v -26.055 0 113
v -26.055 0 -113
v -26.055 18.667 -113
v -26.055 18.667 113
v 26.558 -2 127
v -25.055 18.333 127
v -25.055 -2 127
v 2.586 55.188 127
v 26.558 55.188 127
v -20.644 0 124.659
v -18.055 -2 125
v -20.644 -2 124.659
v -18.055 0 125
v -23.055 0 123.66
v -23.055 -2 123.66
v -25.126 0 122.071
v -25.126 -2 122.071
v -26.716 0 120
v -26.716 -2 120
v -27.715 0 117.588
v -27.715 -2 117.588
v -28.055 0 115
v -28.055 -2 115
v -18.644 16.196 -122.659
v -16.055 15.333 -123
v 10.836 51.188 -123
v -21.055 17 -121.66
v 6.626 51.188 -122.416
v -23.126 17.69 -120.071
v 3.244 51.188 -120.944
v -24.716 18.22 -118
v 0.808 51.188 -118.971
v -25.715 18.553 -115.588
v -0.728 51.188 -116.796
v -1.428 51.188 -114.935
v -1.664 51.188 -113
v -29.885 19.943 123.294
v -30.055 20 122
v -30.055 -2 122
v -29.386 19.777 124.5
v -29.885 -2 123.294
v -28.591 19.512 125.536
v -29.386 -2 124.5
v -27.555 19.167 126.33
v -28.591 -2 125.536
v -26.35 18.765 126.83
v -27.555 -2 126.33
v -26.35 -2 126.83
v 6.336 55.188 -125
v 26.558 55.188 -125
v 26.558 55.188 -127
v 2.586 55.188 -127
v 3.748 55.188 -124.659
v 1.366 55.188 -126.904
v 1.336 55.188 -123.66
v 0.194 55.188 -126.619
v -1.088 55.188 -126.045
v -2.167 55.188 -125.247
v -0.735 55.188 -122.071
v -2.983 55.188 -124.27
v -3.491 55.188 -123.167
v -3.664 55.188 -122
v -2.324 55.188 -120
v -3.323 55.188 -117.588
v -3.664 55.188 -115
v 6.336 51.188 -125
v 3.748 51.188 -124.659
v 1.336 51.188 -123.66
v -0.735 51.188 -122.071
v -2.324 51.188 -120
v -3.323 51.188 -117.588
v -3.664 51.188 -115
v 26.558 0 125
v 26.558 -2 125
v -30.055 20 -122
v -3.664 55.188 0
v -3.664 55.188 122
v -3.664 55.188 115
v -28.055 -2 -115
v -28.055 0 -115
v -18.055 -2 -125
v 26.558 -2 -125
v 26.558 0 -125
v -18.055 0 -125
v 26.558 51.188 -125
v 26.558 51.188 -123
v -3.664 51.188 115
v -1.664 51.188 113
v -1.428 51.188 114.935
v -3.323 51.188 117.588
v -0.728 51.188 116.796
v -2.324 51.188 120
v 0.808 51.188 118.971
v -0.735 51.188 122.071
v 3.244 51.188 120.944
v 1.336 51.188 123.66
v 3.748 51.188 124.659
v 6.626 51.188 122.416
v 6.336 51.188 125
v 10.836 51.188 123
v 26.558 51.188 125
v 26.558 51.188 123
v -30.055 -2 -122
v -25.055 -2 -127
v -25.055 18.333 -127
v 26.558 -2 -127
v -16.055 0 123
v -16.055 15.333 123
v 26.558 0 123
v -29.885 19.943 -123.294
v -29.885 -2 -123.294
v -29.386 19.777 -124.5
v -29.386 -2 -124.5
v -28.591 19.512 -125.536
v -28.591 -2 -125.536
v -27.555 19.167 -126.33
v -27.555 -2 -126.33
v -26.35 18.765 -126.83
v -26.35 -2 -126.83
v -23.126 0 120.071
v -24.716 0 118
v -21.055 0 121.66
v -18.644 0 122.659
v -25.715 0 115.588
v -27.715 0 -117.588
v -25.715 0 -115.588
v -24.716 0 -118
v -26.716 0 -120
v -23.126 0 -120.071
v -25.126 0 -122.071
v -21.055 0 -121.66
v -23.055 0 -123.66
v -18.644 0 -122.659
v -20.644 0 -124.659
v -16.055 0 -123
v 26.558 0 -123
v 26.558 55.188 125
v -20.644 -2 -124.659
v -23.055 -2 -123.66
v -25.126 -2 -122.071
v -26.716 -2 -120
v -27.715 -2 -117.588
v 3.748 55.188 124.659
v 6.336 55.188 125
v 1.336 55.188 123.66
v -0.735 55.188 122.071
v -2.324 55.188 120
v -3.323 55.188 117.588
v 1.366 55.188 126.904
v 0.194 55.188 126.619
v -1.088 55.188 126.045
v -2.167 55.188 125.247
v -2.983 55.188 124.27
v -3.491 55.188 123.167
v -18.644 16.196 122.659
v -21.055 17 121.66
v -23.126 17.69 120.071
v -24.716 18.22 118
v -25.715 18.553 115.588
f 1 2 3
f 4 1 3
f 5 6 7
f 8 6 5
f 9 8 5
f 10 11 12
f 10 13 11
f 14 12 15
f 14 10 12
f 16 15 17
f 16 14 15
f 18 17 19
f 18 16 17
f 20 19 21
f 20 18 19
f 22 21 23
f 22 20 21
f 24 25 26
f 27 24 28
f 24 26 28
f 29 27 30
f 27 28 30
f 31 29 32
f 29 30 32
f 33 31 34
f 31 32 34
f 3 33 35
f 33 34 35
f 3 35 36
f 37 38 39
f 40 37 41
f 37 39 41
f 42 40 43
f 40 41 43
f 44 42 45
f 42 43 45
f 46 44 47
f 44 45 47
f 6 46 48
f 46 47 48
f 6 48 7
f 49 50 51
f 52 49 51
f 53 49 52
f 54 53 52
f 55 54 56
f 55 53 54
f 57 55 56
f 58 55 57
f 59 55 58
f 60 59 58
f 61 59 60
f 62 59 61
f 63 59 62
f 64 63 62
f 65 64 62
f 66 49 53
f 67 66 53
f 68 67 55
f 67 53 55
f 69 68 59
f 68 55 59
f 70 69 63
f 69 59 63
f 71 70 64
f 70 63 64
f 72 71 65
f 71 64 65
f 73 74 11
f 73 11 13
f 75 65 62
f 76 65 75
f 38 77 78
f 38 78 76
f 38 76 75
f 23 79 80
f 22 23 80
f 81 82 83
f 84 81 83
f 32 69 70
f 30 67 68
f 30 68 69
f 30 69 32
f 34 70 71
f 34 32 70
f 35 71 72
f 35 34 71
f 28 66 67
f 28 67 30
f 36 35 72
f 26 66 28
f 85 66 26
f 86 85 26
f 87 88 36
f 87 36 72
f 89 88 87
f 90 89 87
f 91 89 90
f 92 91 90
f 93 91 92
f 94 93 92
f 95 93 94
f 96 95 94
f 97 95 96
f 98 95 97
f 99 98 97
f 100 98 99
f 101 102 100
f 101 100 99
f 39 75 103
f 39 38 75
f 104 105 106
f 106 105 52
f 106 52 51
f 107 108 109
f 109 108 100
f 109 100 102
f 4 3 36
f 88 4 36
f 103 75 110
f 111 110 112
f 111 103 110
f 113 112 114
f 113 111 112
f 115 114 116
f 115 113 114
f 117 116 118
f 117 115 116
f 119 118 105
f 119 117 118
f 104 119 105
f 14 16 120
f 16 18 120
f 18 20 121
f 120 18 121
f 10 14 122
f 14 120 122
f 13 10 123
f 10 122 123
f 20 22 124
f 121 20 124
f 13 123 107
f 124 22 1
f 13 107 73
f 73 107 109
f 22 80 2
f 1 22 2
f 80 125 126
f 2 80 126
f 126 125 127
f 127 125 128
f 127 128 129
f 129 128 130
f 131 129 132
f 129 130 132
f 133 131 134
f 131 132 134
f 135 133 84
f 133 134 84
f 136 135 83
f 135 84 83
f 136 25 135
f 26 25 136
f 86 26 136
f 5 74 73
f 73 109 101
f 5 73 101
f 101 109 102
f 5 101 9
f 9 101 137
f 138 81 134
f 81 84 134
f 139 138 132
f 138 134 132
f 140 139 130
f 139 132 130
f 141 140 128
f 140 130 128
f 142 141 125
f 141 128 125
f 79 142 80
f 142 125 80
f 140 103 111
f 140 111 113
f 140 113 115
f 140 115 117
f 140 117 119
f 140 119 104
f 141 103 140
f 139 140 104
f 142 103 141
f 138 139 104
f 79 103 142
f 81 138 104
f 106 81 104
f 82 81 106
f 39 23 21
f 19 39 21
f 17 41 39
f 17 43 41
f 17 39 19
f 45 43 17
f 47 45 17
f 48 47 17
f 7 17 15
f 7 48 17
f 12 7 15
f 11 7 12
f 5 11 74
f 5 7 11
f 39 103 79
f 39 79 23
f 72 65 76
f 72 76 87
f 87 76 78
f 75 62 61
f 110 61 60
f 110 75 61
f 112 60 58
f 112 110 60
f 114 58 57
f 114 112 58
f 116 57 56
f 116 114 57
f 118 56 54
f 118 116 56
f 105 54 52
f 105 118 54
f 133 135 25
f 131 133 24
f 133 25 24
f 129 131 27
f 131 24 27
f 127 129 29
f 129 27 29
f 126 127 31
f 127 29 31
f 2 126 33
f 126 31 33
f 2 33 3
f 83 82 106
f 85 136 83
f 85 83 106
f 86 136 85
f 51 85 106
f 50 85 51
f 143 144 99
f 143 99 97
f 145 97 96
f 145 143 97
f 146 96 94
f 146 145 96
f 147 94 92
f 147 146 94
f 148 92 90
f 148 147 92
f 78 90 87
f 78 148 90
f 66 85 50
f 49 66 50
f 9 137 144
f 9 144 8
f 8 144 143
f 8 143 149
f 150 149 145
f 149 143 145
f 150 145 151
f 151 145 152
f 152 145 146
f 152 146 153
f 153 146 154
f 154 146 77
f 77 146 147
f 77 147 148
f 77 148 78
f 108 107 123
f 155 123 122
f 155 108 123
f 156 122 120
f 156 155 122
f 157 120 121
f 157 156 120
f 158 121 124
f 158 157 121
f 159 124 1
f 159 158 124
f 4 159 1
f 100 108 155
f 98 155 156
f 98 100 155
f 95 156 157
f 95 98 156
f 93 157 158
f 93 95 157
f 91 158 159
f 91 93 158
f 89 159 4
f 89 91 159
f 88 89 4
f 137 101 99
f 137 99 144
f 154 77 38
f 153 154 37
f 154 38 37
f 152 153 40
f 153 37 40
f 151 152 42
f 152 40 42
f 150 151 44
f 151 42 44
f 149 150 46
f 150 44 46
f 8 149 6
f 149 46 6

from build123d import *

# Parameters (mm, degrees)
SALIENTE_EXTRUIR1_DEPTH = 123
SALIENTE_EXTRUIR2_DEPTH = 4
CROQUIS3_W              = 2
CROQUIS3_H              = 4
CORTAR_EXTRUIR1_DEPTH   = 30.221833509
CROQUIS3_3_W            = 2
CROQUIS3_3_H            = 2
CORTAR_EXTRUIR2_DEPTH   = 54.613071269
REDONDEO2_R             = 10
REDONDEO3_R             = 5


# Read off the part's stored shape, not the designer's step: Simetría1
with BuildPart() as part:
    # Croquis1 → Saliente-Extruir1 (new, symmetric)
    with BuildSketch(Plane.XY):
        Polygon((-30.055424469, 20), (-30.055424469, 0), (-30.055424469, -2), (-28.055424469, -2), (-28.055424469, 0), (-26.055424469, 0), (-26.055424469, 18.666666667), (-1.66418671, 51.188317013), (-3.66418671, 51.188317013), (-3.66418671, 55.188317013), align=None)
    extrude(amount=SALIENTE_EXTRUIR1_DEPTH, both=True)

    # Croquis2 → Saliente-Extruir2 (add)
    with BuildSketch(Plane.XY.offset(123)):
        Polygon((26.5576468, 13.444650029), (26.5576468, 18.666666667), (26.5576468, 55.188317013), (-3.66418671, 55.188317013), (-30.055424469, 20), (-30.055424469, 14.33808094), (-30.055424469, -2), (26.5576468, -2), align=None)
    extrude(amount=SALIENTE_EXTRUIR2_DEPTH)

    # Croquis3 → Cortar-Extruir1 (cut)
    with BuildSketch(Plane(origin=(26.5576468, 0, 0), x_dir=(0, 0, -1), z_dir=(1, 0, 0))):
        with Locations((-124, 53.188317013)):
            Rectangle(CROQUIS3_W, CROQUIS3_H)
    extrude(amount=-CORTAR_EXTRUIR1_DEPTH, mode=Mode.SUBTRACT)

    # Croquis3<3> → Cortar-Extruir2 (cut)
    with BuildSketch(Plane(origin=(26.5576468, 0, 0), x_dir=(0, 0, -1), z_dir=(1, 0, 0))):
        with Locations((-124, -1)):
            Rectangle(CROQUIS3_3_W, CROQUIS3_3_H)
    extrude(amount=-CORTAR_EXTRUIR2_DEPTH, mode=Mode.SUBTRACT)

    # Redondeo2
    redondeo2_edges = [part.edges().sort_by_distance(p)[0] for p in [
        (-26.055424469, 9.333333333, 123),
        (-3.664186709, 53.188317013, 125),
        (-28.055424469, -1, 125),
        (-13.85980559, 34.92749184, 123),
    ]]
    fillet(redondeo2_edges, radius=REDONDEO2_R)

    # Redondeo3
    redondeo3_edges = [part.edges().sort_by_distance(p)[0] for p in [
        (-16.85980559, 37.594158506, 127),
        (-30.055424469, 9, 127),
    ]]
    fillet(redondeo3_edges, radius=REDONDEO3_R)

    # Simetría1
    split(bisect_by=Plane(origin=(0, 0, 0), x_dir=(1, 0, 0), z_dir=(0, 0, -1)), keep=Keep.BOTTOM)

    # Simetr_a1 2: part across plane


with BuildPart() as part_1:
    add(part.part)
    add(part.part.mirror(Plane(origin=(0, 0, 0), x_dir=(1, 0, 0), z_dir=(0, 0, -1))))


solid = part_1.part
